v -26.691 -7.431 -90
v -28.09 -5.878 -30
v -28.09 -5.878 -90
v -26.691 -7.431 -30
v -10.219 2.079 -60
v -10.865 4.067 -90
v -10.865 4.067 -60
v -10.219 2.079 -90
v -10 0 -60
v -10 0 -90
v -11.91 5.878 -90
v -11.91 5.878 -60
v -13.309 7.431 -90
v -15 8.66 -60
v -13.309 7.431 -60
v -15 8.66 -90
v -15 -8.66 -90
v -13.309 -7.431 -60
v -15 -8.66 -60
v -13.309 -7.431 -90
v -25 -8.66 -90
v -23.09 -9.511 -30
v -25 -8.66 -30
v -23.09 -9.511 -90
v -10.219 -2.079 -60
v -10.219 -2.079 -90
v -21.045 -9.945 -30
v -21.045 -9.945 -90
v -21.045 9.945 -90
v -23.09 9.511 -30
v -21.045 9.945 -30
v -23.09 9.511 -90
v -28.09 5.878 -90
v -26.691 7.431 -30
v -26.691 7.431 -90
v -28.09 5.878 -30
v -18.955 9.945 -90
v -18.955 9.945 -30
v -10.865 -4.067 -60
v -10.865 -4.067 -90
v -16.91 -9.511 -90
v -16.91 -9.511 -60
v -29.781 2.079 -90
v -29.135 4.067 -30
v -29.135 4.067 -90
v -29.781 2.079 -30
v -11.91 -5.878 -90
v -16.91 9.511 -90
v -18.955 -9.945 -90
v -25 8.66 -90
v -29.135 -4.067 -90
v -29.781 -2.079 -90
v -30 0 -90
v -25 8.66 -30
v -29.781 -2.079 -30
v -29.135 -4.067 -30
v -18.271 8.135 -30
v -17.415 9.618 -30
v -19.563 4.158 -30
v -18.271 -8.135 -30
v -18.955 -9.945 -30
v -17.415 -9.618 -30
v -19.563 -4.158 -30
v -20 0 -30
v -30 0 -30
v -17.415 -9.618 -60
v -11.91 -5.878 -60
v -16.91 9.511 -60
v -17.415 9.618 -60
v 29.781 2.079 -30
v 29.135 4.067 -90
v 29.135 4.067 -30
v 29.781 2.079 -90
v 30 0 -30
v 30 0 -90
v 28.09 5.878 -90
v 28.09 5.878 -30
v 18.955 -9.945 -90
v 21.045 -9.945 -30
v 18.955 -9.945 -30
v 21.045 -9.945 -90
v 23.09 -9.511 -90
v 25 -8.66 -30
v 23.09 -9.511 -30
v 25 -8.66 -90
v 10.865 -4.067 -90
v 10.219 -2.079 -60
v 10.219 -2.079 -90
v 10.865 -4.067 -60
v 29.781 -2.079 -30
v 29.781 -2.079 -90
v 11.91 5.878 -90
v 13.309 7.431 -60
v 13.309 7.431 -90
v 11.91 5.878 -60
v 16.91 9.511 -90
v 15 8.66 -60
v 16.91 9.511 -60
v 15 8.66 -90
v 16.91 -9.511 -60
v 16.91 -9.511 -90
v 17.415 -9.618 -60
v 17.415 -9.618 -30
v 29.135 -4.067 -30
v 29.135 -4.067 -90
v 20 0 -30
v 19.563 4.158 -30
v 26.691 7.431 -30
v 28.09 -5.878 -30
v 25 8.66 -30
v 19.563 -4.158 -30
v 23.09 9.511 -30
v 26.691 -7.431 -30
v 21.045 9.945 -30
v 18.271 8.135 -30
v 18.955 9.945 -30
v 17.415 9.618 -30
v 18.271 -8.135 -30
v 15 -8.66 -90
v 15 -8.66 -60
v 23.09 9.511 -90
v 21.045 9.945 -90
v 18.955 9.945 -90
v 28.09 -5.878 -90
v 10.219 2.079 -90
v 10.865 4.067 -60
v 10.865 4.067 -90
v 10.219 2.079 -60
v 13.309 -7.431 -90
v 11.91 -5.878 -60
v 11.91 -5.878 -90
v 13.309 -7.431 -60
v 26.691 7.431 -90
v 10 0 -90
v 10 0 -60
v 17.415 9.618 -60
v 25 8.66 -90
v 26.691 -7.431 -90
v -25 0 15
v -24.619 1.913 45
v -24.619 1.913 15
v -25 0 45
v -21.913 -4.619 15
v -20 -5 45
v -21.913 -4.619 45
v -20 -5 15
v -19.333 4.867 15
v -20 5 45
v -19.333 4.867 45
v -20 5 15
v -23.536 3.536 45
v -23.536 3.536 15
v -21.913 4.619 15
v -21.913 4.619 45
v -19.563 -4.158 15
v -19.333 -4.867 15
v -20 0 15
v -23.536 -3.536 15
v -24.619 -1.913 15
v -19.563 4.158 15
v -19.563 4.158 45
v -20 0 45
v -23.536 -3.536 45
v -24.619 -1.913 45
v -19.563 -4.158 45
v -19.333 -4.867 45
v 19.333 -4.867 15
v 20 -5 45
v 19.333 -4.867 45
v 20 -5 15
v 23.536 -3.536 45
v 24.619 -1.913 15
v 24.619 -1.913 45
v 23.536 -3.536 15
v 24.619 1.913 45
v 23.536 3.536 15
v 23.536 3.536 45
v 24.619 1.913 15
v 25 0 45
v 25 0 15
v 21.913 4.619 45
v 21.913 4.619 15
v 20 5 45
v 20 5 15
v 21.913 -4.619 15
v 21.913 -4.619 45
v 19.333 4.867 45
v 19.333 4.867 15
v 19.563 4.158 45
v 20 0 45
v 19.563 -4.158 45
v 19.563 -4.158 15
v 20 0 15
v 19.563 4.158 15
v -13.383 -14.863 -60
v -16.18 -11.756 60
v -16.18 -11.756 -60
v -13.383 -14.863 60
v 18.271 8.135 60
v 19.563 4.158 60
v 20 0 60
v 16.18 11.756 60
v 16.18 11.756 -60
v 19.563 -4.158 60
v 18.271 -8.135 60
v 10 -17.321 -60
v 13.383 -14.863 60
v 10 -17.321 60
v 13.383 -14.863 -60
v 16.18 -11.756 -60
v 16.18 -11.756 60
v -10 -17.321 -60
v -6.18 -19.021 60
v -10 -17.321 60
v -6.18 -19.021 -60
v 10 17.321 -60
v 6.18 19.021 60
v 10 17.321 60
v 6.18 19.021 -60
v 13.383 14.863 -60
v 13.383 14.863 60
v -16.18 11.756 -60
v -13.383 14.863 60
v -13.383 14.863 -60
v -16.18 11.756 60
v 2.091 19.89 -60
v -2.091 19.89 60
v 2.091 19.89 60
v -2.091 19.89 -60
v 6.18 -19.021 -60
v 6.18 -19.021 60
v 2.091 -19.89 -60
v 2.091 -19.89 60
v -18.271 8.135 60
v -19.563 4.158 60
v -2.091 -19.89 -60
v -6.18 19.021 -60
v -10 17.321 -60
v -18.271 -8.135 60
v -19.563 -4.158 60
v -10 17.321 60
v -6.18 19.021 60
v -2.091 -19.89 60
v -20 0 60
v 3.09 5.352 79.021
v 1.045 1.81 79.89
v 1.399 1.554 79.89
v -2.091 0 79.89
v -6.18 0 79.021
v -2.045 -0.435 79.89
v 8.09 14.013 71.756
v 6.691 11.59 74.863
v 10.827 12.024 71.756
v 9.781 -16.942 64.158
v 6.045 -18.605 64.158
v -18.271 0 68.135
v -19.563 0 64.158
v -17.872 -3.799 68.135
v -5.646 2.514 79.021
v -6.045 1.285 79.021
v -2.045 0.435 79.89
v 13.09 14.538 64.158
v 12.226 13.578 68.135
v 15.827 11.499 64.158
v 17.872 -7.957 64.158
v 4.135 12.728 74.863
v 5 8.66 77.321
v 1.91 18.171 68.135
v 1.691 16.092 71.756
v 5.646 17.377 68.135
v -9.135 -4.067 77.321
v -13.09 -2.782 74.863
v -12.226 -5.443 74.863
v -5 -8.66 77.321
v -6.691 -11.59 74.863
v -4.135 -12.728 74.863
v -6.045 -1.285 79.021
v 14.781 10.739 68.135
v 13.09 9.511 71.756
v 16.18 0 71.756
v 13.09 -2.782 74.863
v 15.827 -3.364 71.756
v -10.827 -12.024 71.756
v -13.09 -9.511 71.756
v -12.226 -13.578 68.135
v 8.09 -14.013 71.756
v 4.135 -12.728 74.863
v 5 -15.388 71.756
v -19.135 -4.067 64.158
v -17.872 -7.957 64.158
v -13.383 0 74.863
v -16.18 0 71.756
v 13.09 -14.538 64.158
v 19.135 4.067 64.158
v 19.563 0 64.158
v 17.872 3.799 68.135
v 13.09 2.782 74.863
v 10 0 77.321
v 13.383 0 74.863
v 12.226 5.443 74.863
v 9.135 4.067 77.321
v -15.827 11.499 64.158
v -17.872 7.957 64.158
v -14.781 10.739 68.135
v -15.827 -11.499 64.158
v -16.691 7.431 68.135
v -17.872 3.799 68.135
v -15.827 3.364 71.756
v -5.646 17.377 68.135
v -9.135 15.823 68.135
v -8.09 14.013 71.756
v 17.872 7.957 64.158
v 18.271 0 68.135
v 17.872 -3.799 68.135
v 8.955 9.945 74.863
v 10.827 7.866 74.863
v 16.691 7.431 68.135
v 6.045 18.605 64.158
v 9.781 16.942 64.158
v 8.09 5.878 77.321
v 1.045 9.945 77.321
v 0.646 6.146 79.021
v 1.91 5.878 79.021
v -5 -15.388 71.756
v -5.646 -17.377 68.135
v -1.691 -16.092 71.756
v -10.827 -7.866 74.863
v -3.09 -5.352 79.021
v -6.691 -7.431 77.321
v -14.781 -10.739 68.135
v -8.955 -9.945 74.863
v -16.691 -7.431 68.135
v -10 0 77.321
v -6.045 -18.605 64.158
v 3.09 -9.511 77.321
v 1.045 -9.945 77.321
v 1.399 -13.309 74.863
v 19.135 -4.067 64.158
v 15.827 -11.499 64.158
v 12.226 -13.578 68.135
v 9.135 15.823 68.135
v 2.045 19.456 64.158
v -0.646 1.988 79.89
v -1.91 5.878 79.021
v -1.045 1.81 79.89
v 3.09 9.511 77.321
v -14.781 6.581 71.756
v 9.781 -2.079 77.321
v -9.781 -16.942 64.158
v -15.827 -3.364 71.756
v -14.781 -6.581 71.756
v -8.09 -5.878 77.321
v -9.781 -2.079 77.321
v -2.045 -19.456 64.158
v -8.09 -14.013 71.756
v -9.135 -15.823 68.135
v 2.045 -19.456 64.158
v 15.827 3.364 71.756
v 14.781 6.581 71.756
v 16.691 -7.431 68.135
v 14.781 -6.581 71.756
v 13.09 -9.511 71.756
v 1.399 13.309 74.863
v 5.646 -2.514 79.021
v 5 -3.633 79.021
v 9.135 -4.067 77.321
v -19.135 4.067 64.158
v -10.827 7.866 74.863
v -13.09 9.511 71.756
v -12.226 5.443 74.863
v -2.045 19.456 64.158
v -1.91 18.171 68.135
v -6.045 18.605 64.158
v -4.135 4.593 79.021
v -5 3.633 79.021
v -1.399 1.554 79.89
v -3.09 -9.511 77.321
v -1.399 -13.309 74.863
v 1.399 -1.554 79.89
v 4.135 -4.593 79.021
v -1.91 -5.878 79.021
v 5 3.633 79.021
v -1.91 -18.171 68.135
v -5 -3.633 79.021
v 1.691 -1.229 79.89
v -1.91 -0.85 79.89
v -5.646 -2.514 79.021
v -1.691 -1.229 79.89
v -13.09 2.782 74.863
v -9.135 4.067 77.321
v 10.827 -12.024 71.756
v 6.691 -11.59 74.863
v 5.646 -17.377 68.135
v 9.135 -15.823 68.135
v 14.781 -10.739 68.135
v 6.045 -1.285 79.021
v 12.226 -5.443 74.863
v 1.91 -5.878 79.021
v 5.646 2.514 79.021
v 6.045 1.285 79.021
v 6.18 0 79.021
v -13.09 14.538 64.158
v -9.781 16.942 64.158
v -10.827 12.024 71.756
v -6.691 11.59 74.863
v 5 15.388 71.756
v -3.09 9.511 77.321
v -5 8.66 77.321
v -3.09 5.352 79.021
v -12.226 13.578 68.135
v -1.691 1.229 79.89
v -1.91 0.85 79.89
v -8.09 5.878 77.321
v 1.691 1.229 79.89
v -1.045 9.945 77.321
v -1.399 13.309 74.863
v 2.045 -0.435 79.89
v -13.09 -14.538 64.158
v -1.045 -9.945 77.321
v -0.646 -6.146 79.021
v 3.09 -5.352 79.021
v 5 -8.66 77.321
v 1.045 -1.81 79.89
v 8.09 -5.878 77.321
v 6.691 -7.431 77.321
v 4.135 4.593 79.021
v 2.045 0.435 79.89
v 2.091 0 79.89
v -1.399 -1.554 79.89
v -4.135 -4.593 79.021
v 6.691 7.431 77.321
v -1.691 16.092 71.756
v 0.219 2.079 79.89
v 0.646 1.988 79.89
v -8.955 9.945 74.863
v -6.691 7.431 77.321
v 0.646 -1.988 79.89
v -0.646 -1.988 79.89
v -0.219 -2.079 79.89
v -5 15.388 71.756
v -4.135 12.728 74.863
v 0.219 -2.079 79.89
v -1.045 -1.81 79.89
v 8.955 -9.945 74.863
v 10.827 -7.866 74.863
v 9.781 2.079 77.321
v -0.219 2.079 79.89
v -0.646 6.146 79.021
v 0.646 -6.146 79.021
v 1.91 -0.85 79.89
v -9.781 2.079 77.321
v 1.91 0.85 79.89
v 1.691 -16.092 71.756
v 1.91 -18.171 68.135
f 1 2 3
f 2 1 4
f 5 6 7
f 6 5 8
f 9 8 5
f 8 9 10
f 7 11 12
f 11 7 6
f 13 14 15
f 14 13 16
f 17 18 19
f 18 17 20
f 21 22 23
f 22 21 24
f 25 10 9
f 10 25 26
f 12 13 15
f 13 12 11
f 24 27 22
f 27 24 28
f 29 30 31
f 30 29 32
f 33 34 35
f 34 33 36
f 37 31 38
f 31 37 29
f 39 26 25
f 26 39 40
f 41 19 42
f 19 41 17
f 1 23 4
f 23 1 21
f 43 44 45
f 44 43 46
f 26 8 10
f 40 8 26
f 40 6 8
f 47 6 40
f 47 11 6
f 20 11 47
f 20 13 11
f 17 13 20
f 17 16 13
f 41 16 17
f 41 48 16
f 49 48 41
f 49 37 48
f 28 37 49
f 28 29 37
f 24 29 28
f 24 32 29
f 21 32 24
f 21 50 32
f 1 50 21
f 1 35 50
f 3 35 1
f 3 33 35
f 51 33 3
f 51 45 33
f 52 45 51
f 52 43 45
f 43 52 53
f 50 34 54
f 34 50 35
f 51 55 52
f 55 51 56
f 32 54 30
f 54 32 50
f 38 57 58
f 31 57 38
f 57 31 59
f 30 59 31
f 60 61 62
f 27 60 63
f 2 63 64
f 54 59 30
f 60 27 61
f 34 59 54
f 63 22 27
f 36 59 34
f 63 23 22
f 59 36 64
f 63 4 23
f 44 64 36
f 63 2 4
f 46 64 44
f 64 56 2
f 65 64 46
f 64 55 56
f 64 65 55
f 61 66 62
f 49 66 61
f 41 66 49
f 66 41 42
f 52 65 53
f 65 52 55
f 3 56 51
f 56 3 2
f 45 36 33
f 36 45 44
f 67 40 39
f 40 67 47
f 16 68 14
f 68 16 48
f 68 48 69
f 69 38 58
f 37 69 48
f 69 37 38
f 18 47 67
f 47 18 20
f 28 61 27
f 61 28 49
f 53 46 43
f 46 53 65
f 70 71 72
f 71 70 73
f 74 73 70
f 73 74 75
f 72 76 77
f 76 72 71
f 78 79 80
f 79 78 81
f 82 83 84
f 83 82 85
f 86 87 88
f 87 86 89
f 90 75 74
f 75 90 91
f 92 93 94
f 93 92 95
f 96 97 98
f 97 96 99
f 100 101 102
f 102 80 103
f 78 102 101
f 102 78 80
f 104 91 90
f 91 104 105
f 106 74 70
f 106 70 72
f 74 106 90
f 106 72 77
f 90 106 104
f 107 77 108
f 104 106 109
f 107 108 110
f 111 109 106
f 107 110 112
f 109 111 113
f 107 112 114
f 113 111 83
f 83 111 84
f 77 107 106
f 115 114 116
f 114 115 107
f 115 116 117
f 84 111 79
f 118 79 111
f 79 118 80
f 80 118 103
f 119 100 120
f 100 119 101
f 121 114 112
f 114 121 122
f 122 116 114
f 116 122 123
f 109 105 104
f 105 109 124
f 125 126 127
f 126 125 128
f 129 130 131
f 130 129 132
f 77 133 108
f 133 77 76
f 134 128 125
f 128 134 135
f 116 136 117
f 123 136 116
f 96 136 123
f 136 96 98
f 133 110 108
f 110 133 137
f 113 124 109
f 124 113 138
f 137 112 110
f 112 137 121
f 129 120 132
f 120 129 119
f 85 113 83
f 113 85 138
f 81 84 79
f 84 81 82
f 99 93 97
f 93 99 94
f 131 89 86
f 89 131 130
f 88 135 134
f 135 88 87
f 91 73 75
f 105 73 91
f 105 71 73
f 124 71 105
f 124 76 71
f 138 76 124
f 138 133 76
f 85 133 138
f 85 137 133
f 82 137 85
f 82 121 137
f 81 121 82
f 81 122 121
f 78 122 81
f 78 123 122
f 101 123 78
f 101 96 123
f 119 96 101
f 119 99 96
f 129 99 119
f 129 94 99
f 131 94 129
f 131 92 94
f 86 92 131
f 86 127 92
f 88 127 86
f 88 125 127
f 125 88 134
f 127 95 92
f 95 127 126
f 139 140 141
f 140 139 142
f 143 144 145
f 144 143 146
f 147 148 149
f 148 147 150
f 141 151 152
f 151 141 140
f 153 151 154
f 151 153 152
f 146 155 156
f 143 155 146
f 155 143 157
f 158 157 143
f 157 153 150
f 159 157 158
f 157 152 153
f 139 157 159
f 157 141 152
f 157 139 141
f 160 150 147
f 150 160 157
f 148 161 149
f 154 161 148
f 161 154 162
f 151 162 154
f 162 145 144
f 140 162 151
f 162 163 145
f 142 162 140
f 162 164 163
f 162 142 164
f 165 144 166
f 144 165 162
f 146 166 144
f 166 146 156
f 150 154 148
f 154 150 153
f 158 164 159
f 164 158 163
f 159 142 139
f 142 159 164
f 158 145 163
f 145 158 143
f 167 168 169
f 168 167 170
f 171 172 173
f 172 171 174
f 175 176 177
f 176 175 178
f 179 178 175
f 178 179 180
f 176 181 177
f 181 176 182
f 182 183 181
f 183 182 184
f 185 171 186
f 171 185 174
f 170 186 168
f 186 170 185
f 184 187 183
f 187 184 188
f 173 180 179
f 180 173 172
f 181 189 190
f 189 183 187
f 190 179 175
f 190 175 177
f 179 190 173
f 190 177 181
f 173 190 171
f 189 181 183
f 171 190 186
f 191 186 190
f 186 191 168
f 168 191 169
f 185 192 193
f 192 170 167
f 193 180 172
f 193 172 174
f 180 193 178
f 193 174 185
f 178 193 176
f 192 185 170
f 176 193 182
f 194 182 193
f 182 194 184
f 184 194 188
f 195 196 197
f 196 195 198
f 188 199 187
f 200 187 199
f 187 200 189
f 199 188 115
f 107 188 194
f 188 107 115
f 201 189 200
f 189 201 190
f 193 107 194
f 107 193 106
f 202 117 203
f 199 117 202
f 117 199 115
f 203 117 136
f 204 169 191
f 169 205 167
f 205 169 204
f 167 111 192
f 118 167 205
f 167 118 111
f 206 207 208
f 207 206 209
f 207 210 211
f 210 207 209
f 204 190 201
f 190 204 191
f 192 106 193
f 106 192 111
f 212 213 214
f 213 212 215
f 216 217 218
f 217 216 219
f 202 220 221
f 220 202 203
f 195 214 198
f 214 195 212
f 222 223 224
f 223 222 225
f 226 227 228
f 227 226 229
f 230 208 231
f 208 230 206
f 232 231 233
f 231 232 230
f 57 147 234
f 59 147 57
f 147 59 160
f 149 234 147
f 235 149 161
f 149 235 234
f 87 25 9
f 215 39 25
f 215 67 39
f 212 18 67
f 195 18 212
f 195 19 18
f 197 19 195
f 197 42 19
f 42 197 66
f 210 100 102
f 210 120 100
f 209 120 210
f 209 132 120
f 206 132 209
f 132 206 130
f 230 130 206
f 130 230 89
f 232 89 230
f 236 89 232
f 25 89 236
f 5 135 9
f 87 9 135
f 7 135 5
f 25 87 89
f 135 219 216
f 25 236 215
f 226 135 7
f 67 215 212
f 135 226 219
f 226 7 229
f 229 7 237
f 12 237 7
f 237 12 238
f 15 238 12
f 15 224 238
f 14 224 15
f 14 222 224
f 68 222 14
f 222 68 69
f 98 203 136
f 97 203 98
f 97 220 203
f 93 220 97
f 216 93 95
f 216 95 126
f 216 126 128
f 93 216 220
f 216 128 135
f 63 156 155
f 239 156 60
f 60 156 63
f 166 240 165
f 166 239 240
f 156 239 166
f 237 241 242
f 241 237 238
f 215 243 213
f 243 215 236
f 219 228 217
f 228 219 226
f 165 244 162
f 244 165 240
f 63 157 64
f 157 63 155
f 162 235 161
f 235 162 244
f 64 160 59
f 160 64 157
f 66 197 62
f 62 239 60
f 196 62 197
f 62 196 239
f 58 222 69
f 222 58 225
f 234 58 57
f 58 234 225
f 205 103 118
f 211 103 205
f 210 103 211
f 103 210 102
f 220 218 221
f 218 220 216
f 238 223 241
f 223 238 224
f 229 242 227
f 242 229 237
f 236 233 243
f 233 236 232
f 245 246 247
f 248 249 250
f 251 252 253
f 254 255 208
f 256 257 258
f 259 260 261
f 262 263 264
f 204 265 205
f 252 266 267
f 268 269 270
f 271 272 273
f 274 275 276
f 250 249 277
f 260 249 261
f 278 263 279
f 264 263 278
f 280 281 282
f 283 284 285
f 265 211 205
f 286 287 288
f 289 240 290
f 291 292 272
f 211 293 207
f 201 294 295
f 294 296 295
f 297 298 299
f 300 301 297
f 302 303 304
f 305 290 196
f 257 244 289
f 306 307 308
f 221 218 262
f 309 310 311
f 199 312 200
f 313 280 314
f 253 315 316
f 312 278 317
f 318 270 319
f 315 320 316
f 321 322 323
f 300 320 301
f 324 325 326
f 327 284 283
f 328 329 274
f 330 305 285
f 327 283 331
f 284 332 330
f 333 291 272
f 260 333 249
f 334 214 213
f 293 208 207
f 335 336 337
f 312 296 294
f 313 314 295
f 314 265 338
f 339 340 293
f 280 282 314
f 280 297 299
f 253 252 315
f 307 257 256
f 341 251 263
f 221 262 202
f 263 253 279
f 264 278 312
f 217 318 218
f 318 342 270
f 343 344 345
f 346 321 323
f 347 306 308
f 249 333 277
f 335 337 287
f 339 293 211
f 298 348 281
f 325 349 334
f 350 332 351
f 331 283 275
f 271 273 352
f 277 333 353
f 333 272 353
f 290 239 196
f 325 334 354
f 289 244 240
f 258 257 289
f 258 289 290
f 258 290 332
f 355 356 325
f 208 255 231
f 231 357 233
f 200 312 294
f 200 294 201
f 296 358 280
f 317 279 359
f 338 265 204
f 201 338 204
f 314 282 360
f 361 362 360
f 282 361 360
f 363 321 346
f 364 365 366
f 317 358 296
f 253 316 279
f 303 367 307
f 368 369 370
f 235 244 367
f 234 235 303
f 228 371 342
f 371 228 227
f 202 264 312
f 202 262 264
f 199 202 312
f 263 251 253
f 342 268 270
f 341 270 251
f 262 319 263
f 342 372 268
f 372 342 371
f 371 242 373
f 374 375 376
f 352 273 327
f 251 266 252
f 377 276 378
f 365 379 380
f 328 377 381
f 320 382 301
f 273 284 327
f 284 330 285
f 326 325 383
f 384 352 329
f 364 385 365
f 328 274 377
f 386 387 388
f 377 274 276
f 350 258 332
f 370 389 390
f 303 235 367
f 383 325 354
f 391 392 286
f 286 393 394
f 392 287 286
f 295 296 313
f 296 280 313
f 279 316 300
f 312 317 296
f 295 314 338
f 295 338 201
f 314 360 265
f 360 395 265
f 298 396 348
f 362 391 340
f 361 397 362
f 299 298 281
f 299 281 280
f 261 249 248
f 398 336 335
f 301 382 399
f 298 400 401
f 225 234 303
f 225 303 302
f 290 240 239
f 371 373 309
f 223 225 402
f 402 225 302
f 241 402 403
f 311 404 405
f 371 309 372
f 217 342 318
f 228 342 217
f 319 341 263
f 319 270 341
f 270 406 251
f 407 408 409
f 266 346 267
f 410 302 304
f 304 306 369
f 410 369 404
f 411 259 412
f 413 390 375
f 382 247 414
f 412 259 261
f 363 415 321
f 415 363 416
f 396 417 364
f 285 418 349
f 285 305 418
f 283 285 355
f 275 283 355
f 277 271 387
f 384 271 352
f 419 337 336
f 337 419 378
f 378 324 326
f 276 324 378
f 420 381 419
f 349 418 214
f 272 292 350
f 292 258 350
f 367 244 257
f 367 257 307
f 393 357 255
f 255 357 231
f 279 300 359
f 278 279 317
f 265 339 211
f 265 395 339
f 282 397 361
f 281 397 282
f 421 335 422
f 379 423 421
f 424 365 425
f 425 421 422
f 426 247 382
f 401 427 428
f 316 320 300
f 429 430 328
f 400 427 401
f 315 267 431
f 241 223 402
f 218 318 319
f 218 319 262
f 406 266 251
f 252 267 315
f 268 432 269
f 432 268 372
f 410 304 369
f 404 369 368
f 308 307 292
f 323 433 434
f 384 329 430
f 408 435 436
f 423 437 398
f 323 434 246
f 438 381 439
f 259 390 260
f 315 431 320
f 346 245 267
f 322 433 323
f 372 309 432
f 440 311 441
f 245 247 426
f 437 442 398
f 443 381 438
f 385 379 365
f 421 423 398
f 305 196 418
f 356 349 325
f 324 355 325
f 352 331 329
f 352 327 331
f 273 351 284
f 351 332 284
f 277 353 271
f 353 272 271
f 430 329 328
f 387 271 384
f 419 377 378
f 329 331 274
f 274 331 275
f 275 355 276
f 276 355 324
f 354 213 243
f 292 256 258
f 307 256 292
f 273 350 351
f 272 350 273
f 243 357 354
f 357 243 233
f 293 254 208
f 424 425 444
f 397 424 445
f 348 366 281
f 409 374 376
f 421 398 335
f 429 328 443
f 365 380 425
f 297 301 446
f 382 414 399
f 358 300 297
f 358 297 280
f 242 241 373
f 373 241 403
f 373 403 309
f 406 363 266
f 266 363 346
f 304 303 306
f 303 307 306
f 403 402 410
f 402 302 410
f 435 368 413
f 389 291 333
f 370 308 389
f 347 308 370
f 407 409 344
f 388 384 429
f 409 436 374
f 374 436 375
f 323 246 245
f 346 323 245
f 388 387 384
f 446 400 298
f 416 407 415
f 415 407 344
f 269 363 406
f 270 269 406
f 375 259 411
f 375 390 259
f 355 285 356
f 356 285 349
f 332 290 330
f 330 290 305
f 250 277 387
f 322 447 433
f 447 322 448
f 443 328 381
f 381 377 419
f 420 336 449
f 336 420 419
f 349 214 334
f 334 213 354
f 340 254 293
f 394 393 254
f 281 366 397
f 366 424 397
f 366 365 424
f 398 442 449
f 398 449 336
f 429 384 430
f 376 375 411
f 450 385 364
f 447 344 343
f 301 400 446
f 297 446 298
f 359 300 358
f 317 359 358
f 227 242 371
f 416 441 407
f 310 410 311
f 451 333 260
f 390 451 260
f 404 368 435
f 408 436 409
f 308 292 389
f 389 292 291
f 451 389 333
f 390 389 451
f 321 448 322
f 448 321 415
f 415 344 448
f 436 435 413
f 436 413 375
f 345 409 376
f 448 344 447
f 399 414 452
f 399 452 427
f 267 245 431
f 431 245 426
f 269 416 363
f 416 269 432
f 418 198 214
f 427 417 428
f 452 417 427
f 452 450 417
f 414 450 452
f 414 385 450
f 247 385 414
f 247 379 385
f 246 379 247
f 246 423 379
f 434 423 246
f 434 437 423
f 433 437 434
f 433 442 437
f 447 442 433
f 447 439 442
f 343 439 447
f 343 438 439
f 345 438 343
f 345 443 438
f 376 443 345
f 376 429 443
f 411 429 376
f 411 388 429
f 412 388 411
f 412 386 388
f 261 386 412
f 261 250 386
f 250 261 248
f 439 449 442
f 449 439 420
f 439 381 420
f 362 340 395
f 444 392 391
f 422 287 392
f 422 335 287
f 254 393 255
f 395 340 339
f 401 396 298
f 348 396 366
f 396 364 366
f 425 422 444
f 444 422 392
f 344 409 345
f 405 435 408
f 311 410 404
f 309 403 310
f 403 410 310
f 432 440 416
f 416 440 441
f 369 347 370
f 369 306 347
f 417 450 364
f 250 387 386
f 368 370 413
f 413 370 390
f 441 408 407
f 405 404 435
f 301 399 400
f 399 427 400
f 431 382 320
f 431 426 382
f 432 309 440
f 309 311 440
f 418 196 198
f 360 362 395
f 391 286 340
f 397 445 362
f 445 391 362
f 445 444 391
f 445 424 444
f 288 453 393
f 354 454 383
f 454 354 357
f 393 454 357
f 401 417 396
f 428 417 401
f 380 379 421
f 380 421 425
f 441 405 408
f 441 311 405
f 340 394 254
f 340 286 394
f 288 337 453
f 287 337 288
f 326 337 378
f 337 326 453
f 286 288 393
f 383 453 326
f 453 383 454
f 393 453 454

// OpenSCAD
// Auto-generated Code Vault for 'HumanoidRobot' [Openscad]

module HumanoidRobot() {
    // Body
    cylinder(h = 120, r = 20, center = true);

    // Head
    translate([0, 0, 60])
    sphere(r = 20);

    // Legs
    translate([0, 0, -60])
    for (i = [-1, 1]) {
        translate([i * 20, 0, 0])
        cylinder(h = 60, r = 10, center = true);
    }

    // Arms
    translate([0, 0, 30])
    for (i = [-1, 1]) {
        translate([i * 20, 0, 0])
        cylinder(h = 30, r = 5, center = true);
    }
}

HumanoidRobot();
